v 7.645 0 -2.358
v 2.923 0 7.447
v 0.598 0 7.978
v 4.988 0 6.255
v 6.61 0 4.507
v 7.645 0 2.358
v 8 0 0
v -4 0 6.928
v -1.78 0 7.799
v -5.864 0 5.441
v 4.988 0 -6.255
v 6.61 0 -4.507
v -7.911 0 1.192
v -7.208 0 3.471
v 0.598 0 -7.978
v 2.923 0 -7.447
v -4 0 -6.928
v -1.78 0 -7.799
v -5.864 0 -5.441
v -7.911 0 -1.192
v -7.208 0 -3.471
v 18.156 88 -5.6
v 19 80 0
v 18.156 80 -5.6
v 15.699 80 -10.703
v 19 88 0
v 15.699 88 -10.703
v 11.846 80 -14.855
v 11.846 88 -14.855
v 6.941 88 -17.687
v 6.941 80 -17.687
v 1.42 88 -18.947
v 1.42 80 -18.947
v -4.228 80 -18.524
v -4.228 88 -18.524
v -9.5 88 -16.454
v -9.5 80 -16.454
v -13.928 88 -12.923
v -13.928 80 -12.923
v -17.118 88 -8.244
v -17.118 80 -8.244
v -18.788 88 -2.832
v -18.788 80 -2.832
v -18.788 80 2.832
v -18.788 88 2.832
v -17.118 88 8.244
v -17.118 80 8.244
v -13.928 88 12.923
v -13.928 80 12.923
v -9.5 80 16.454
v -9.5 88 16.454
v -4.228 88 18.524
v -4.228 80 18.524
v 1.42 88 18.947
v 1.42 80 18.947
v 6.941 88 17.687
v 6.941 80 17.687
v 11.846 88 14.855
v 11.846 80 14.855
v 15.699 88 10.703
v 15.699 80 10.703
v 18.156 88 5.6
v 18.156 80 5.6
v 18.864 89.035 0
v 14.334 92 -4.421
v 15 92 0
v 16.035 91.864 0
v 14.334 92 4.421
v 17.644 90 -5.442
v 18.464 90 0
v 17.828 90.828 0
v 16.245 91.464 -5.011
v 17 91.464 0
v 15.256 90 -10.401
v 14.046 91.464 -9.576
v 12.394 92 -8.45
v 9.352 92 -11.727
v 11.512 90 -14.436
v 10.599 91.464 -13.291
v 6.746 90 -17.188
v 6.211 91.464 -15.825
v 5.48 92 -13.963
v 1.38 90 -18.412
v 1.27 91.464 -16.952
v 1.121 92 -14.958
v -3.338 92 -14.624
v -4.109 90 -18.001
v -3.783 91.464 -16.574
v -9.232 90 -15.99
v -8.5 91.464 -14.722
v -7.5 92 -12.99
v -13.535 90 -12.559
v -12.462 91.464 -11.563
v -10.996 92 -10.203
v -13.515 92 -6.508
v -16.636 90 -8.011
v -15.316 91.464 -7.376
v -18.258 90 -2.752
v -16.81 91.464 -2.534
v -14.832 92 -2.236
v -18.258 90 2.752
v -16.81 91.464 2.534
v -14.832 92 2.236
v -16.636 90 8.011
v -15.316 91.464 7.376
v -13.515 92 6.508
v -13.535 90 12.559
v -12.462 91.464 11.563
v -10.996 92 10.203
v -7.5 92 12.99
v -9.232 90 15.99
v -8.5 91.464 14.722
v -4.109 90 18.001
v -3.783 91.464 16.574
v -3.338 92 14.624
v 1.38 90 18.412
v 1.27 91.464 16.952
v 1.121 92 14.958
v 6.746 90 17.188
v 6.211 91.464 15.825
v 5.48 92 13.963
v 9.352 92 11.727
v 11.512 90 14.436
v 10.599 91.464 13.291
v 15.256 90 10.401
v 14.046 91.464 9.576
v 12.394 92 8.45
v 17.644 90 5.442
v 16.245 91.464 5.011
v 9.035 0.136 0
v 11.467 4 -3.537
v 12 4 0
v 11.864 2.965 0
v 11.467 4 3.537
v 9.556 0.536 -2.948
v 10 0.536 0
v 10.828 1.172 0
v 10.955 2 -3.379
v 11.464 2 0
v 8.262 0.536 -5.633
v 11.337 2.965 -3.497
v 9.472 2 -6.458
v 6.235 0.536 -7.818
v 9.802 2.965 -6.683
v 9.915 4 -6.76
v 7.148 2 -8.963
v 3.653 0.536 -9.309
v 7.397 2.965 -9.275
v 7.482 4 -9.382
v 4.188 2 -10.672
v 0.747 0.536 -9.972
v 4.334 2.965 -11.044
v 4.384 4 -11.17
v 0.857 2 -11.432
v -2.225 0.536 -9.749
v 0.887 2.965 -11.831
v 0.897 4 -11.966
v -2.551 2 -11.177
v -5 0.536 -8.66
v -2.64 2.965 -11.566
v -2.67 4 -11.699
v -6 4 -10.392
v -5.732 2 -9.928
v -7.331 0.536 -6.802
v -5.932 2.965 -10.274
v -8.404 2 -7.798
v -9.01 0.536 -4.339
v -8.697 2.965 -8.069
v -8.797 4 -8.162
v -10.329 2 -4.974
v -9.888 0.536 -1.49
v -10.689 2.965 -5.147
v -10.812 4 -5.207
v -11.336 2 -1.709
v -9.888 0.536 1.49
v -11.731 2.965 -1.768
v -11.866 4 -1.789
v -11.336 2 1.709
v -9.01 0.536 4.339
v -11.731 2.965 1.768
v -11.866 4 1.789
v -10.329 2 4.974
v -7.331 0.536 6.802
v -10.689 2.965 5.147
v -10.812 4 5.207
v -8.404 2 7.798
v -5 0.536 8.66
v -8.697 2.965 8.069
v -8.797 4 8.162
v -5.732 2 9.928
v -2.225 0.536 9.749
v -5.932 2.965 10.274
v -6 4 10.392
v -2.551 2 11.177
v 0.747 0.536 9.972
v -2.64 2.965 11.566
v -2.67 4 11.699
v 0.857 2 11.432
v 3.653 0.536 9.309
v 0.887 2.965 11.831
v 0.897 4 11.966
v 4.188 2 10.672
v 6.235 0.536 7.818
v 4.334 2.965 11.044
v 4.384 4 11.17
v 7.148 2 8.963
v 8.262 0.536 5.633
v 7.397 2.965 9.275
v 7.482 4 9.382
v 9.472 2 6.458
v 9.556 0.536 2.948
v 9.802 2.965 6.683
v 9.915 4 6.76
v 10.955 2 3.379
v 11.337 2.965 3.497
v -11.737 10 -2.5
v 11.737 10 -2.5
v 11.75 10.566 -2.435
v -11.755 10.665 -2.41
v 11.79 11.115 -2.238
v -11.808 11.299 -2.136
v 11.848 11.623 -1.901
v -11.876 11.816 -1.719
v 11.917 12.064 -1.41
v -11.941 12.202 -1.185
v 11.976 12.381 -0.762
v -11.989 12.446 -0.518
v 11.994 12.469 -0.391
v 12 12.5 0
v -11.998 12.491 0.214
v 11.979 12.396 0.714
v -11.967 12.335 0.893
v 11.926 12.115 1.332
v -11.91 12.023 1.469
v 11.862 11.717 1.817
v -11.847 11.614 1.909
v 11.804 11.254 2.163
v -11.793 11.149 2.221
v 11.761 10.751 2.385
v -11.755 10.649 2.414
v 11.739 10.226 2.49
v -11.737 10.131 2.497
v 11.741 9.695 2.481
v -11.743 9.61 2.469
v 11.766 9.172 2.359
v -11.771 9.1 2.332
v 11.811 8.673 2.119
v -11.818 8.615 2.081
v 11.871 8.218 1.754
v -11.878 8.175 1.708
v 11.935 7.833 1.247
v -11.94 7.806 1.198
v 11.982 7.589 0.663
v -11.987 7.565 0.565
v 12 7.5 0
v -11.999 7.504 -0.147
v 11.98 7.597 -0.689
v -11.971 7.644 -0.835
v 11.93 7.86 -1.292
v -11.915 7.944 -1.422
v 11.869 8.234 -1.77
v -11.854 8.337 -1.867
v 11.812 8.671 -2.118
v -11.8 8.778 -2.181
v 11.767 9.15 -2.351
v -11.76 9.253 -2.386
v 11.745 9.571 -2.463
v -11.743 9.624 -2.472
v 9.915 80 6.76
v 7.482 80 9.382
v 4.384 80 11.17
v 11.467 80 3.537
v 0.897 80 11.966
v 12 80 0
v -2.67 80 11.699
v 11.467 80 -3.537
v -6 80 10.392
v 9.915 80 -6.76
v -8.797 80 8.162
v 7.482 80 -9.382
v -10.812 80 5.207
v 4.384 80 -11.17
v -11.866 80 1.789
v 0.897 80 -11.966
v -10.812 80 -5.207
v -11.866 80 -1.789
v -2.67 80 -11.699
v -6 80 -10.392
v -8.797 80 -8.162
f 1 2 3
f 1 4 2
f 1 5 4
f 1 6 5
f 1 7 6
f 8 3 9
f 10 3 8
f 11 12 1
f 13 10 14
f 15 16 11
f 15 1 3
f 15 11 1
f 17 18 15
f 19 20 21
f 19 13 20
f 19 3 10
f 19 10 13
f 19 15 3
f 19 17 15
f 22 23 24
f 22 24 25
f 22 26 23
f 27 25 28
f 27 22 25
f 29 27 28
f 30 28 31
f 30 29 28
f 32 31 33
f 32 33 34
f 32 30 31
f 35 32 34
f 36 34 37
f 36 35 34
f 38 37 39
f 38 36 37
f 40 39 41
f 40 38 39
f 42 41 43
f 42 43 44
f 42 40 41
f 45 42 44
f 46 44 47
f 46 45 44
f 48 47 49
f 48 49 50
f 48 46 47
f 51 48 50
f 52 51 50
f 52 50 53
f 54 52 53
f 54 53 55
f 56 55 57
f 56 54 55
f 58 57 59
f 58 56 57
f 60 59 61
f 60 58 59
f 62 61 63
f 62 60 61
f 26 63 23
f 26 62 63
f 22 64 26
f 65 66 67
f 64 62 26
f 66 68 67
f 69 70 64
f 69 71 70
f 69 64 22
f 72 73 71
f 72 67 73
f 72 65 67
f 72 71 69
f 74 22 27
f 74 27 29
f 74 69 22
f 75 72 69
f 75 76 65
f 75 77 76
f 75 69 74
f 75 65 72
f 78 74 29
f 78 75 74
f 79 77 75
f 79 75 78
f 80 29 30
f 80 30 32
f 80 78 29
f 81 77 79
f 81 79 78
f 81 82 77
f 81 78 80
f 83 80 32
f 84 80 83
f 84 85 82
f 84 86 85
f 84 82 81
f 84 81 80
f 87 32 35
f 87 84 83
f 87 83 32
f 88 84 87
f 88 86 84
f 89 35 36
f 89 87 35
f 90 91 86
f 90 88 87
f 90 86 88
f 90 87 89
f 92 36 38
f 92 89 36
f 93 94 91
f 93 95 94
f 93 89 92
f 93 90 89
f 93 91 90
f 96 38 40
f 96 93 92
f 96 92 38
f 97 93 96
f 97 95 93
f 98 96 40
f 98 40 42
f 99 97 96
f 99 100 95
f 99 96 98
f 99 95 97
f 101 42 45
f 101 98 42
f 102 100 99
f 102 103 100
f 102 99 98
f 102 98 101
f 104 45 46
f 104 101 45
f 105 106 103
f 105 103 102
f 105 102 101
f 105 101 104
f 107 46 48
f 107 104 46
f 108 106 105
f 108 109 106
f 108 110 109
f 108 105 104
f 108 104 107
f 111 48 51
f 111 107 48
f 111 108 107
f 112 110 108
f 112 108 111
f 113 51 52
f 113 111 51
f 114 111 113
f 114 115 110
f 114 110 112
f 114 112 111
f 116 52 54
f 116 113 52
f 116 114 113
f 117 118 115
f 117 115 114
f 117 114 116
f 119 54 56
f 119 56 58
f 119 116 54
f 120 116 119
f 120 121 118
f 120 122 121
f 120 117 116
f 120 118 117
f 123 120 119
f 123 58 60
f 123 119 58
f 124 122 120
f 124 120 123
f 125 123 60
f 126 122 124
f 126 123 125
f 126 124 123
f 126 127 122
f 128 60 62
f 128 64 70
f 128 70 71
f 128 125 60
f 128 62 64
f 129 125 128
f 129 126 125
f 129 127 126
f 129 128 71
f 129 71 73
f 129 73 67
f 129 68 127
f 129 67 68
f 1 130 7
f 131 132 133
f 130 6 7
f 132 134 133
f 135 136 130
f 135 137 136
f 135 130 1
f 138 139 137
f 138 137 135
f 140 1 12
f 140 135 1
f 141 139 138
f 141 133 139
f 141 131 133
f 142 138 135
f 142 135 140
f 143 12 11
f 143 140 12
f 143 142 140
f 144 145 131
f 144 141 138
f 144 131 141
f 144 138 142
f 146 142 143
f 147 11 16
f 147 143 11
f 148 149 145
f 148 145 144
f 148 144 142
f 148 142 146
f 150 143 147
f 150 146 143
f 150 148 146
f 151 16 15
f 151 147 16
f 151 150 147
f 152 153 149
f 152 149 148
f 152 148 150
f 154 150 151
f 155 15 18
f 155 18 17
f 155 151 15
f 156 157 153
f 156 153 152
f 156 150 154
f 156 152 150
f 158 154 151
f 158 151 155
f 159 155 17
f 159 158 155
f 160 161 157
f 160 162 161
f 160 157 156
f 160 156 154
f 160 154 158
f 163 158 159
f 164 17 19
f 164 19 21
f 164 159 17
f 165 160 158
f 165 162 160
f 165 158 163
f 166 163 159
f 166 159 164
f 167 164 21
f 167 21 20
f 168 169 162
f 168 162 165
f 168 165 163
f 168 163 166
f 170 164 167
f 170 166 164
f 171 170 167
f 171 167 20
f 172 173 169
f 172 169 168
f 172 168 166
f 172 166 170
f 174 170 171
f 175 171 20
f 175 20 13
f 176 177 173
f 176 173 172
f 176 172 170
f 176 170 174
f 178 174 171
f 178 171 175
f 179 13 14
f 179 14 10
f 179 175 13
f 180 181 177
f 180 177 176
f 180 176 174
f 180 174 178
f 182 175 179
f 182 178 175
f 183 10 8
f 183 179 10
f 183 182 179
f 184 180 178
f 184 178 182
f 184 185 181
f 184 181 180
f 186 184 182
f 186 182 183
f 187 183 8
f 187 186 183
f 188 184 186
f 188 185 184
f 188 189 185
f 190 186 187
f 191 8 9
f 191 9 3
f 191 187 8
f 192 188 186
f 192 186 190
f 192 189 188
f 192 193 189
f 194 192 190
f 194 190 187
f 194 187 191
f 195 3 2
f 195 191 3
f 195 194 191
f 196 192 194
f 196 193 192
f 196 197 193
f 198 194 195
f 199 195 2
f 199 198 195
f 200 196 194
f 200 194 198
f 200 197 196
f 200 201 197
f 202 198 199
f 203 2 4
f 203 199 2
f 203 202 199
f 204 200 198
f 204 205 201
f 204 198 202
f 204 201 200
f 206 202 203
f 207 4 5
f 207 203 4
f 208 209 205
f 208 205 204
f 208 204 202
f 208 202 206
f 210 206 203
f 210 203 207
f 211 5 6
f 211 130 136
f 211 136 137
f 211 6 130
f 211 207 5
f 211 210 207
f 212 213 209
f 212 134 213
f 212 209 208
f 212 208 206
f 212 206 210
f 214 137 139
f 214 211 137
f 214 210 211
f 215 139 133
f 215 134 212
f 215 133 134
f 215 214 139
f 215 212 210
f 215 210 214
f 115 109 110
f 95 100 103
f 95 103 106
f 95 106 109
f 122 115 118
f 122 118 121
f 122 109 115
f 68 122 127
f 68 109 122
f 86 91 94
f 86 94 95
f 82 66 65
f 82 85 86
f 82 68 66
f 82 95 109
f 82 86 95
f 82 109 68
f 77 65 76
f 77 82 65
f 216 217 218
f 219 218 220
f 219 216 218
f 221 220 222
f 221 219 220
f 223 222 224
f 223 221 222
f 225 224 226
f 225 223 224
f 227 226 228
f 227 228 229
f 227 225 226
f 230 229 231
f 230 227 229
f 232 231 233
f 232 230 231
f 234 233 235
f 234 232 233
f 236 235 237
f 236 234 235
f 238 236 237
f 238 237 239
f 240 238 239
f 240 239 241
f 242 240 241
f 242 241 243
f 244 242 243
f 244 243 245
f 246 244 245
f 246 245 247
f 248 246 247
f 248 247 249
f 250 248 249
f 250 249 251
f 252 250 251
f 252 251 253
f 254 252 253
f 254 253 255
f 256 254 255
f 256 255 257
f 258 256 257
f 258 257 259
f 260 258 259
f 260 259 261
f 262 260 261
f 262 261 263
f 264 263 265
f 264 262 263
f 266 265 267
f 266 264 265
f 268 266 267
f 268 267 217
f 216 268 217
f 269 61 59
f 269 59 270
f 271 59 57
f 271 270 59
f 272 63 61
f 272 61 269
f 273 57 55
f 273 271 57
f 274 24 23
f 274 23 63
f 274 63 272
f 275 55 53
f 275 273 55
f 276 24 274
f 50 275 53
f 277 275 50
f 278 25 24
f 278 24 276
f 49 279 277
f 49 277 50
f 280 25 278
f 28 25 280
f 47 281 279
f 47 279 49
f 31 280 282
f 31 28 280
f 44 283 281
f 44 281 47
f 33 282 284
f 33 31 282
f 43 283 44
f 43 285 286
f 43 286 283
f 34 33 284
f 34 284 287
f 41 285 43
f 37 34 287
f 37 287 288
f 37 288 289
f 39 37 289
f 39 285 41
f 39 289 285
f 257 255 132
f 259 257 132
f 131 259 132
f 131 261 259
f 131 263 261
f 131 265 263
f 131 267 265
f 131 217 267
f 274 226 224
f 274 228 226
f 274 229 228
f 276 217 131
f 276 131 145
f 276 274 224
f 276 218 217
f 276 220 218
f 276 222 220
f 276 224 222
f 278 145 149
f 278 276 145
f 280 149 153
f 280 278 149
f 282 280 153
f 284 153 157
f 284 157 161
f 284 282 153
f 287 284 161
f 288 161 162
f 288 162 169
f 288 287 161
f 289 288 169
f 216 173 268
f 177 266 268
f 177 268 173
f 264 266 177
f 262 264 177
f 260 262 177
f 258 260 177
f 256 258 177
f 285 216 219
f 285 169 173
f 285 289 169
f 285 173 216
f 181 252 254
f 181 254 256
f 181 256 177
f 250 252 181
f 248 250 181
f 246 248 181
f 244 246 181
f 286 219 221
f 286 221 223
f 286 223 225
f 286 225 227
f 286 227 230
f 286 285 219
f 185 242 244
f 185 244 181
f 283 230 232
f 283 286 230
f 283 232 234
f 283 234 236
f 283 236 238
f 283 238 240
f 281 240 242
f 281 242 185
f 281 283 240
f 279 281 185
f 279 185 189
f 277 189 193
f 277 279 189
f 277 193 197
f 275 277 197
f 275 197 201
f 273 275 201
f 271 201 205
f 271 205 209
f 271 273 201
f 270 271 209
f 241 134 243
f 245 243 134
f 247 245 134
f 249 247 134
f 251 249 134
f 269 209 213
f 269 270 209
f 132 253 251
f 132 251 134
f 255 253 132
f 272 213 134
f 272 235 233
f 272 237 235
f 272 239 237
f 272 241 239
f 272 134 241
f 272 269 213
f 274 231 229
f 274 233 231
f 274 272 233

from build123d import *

# Parameters (mm, degrees)
CUT_EXTRUDE1_DEPTH      = 96.843622656
CUT_EXTRUDE1_DEPTH_BACK = 96.843622656
SKETCH2_R               = 2.5


with BuildPart() as part:
    # Sketch1 → Revolve1 (revolve)
    with BuildSketch(Plane.XY):
        with BuildLine():
            Line((0, 0), (8, 0))
            ThreePointArc((8, 0), (10.828427125, 1.171572875), (12, 4))
            Line((12, 4), (12, 80))
            Line((12, 80), (19, 80))
            Line((19, 80), (19, 88))
            ThreePointArc((19, 88), (17.828427125, 90.828427125), (15, 92))
            Line((15, 92), (0, 92))
            Line((0, 92), (0, 0))
        make_face()
    revolve(axis=Axis((0, -790.652262501, 0), (0, 1, 0)))

    # Sketch2 → Cut-Extrude1 (cut, two sides: drawn at the far end of the back side and taken through both)
    with BuildSketch(Plane(origin=(0, 0, 0), x_dir=(0, 0, -1), z_dir=(1, 0, 0)).offset(-CUT_EXTRUDE1_DEPTH_BACK)):
        with Locations((0, 10)):
            Circle(SKETCH2_R)
    extrude(amount=CUT_EXTRUDE1_DEPTH + CUT_EXTRUDE1_DEPTH_BACK, mode=Mode.SUBTRACT)


solid = part.part
